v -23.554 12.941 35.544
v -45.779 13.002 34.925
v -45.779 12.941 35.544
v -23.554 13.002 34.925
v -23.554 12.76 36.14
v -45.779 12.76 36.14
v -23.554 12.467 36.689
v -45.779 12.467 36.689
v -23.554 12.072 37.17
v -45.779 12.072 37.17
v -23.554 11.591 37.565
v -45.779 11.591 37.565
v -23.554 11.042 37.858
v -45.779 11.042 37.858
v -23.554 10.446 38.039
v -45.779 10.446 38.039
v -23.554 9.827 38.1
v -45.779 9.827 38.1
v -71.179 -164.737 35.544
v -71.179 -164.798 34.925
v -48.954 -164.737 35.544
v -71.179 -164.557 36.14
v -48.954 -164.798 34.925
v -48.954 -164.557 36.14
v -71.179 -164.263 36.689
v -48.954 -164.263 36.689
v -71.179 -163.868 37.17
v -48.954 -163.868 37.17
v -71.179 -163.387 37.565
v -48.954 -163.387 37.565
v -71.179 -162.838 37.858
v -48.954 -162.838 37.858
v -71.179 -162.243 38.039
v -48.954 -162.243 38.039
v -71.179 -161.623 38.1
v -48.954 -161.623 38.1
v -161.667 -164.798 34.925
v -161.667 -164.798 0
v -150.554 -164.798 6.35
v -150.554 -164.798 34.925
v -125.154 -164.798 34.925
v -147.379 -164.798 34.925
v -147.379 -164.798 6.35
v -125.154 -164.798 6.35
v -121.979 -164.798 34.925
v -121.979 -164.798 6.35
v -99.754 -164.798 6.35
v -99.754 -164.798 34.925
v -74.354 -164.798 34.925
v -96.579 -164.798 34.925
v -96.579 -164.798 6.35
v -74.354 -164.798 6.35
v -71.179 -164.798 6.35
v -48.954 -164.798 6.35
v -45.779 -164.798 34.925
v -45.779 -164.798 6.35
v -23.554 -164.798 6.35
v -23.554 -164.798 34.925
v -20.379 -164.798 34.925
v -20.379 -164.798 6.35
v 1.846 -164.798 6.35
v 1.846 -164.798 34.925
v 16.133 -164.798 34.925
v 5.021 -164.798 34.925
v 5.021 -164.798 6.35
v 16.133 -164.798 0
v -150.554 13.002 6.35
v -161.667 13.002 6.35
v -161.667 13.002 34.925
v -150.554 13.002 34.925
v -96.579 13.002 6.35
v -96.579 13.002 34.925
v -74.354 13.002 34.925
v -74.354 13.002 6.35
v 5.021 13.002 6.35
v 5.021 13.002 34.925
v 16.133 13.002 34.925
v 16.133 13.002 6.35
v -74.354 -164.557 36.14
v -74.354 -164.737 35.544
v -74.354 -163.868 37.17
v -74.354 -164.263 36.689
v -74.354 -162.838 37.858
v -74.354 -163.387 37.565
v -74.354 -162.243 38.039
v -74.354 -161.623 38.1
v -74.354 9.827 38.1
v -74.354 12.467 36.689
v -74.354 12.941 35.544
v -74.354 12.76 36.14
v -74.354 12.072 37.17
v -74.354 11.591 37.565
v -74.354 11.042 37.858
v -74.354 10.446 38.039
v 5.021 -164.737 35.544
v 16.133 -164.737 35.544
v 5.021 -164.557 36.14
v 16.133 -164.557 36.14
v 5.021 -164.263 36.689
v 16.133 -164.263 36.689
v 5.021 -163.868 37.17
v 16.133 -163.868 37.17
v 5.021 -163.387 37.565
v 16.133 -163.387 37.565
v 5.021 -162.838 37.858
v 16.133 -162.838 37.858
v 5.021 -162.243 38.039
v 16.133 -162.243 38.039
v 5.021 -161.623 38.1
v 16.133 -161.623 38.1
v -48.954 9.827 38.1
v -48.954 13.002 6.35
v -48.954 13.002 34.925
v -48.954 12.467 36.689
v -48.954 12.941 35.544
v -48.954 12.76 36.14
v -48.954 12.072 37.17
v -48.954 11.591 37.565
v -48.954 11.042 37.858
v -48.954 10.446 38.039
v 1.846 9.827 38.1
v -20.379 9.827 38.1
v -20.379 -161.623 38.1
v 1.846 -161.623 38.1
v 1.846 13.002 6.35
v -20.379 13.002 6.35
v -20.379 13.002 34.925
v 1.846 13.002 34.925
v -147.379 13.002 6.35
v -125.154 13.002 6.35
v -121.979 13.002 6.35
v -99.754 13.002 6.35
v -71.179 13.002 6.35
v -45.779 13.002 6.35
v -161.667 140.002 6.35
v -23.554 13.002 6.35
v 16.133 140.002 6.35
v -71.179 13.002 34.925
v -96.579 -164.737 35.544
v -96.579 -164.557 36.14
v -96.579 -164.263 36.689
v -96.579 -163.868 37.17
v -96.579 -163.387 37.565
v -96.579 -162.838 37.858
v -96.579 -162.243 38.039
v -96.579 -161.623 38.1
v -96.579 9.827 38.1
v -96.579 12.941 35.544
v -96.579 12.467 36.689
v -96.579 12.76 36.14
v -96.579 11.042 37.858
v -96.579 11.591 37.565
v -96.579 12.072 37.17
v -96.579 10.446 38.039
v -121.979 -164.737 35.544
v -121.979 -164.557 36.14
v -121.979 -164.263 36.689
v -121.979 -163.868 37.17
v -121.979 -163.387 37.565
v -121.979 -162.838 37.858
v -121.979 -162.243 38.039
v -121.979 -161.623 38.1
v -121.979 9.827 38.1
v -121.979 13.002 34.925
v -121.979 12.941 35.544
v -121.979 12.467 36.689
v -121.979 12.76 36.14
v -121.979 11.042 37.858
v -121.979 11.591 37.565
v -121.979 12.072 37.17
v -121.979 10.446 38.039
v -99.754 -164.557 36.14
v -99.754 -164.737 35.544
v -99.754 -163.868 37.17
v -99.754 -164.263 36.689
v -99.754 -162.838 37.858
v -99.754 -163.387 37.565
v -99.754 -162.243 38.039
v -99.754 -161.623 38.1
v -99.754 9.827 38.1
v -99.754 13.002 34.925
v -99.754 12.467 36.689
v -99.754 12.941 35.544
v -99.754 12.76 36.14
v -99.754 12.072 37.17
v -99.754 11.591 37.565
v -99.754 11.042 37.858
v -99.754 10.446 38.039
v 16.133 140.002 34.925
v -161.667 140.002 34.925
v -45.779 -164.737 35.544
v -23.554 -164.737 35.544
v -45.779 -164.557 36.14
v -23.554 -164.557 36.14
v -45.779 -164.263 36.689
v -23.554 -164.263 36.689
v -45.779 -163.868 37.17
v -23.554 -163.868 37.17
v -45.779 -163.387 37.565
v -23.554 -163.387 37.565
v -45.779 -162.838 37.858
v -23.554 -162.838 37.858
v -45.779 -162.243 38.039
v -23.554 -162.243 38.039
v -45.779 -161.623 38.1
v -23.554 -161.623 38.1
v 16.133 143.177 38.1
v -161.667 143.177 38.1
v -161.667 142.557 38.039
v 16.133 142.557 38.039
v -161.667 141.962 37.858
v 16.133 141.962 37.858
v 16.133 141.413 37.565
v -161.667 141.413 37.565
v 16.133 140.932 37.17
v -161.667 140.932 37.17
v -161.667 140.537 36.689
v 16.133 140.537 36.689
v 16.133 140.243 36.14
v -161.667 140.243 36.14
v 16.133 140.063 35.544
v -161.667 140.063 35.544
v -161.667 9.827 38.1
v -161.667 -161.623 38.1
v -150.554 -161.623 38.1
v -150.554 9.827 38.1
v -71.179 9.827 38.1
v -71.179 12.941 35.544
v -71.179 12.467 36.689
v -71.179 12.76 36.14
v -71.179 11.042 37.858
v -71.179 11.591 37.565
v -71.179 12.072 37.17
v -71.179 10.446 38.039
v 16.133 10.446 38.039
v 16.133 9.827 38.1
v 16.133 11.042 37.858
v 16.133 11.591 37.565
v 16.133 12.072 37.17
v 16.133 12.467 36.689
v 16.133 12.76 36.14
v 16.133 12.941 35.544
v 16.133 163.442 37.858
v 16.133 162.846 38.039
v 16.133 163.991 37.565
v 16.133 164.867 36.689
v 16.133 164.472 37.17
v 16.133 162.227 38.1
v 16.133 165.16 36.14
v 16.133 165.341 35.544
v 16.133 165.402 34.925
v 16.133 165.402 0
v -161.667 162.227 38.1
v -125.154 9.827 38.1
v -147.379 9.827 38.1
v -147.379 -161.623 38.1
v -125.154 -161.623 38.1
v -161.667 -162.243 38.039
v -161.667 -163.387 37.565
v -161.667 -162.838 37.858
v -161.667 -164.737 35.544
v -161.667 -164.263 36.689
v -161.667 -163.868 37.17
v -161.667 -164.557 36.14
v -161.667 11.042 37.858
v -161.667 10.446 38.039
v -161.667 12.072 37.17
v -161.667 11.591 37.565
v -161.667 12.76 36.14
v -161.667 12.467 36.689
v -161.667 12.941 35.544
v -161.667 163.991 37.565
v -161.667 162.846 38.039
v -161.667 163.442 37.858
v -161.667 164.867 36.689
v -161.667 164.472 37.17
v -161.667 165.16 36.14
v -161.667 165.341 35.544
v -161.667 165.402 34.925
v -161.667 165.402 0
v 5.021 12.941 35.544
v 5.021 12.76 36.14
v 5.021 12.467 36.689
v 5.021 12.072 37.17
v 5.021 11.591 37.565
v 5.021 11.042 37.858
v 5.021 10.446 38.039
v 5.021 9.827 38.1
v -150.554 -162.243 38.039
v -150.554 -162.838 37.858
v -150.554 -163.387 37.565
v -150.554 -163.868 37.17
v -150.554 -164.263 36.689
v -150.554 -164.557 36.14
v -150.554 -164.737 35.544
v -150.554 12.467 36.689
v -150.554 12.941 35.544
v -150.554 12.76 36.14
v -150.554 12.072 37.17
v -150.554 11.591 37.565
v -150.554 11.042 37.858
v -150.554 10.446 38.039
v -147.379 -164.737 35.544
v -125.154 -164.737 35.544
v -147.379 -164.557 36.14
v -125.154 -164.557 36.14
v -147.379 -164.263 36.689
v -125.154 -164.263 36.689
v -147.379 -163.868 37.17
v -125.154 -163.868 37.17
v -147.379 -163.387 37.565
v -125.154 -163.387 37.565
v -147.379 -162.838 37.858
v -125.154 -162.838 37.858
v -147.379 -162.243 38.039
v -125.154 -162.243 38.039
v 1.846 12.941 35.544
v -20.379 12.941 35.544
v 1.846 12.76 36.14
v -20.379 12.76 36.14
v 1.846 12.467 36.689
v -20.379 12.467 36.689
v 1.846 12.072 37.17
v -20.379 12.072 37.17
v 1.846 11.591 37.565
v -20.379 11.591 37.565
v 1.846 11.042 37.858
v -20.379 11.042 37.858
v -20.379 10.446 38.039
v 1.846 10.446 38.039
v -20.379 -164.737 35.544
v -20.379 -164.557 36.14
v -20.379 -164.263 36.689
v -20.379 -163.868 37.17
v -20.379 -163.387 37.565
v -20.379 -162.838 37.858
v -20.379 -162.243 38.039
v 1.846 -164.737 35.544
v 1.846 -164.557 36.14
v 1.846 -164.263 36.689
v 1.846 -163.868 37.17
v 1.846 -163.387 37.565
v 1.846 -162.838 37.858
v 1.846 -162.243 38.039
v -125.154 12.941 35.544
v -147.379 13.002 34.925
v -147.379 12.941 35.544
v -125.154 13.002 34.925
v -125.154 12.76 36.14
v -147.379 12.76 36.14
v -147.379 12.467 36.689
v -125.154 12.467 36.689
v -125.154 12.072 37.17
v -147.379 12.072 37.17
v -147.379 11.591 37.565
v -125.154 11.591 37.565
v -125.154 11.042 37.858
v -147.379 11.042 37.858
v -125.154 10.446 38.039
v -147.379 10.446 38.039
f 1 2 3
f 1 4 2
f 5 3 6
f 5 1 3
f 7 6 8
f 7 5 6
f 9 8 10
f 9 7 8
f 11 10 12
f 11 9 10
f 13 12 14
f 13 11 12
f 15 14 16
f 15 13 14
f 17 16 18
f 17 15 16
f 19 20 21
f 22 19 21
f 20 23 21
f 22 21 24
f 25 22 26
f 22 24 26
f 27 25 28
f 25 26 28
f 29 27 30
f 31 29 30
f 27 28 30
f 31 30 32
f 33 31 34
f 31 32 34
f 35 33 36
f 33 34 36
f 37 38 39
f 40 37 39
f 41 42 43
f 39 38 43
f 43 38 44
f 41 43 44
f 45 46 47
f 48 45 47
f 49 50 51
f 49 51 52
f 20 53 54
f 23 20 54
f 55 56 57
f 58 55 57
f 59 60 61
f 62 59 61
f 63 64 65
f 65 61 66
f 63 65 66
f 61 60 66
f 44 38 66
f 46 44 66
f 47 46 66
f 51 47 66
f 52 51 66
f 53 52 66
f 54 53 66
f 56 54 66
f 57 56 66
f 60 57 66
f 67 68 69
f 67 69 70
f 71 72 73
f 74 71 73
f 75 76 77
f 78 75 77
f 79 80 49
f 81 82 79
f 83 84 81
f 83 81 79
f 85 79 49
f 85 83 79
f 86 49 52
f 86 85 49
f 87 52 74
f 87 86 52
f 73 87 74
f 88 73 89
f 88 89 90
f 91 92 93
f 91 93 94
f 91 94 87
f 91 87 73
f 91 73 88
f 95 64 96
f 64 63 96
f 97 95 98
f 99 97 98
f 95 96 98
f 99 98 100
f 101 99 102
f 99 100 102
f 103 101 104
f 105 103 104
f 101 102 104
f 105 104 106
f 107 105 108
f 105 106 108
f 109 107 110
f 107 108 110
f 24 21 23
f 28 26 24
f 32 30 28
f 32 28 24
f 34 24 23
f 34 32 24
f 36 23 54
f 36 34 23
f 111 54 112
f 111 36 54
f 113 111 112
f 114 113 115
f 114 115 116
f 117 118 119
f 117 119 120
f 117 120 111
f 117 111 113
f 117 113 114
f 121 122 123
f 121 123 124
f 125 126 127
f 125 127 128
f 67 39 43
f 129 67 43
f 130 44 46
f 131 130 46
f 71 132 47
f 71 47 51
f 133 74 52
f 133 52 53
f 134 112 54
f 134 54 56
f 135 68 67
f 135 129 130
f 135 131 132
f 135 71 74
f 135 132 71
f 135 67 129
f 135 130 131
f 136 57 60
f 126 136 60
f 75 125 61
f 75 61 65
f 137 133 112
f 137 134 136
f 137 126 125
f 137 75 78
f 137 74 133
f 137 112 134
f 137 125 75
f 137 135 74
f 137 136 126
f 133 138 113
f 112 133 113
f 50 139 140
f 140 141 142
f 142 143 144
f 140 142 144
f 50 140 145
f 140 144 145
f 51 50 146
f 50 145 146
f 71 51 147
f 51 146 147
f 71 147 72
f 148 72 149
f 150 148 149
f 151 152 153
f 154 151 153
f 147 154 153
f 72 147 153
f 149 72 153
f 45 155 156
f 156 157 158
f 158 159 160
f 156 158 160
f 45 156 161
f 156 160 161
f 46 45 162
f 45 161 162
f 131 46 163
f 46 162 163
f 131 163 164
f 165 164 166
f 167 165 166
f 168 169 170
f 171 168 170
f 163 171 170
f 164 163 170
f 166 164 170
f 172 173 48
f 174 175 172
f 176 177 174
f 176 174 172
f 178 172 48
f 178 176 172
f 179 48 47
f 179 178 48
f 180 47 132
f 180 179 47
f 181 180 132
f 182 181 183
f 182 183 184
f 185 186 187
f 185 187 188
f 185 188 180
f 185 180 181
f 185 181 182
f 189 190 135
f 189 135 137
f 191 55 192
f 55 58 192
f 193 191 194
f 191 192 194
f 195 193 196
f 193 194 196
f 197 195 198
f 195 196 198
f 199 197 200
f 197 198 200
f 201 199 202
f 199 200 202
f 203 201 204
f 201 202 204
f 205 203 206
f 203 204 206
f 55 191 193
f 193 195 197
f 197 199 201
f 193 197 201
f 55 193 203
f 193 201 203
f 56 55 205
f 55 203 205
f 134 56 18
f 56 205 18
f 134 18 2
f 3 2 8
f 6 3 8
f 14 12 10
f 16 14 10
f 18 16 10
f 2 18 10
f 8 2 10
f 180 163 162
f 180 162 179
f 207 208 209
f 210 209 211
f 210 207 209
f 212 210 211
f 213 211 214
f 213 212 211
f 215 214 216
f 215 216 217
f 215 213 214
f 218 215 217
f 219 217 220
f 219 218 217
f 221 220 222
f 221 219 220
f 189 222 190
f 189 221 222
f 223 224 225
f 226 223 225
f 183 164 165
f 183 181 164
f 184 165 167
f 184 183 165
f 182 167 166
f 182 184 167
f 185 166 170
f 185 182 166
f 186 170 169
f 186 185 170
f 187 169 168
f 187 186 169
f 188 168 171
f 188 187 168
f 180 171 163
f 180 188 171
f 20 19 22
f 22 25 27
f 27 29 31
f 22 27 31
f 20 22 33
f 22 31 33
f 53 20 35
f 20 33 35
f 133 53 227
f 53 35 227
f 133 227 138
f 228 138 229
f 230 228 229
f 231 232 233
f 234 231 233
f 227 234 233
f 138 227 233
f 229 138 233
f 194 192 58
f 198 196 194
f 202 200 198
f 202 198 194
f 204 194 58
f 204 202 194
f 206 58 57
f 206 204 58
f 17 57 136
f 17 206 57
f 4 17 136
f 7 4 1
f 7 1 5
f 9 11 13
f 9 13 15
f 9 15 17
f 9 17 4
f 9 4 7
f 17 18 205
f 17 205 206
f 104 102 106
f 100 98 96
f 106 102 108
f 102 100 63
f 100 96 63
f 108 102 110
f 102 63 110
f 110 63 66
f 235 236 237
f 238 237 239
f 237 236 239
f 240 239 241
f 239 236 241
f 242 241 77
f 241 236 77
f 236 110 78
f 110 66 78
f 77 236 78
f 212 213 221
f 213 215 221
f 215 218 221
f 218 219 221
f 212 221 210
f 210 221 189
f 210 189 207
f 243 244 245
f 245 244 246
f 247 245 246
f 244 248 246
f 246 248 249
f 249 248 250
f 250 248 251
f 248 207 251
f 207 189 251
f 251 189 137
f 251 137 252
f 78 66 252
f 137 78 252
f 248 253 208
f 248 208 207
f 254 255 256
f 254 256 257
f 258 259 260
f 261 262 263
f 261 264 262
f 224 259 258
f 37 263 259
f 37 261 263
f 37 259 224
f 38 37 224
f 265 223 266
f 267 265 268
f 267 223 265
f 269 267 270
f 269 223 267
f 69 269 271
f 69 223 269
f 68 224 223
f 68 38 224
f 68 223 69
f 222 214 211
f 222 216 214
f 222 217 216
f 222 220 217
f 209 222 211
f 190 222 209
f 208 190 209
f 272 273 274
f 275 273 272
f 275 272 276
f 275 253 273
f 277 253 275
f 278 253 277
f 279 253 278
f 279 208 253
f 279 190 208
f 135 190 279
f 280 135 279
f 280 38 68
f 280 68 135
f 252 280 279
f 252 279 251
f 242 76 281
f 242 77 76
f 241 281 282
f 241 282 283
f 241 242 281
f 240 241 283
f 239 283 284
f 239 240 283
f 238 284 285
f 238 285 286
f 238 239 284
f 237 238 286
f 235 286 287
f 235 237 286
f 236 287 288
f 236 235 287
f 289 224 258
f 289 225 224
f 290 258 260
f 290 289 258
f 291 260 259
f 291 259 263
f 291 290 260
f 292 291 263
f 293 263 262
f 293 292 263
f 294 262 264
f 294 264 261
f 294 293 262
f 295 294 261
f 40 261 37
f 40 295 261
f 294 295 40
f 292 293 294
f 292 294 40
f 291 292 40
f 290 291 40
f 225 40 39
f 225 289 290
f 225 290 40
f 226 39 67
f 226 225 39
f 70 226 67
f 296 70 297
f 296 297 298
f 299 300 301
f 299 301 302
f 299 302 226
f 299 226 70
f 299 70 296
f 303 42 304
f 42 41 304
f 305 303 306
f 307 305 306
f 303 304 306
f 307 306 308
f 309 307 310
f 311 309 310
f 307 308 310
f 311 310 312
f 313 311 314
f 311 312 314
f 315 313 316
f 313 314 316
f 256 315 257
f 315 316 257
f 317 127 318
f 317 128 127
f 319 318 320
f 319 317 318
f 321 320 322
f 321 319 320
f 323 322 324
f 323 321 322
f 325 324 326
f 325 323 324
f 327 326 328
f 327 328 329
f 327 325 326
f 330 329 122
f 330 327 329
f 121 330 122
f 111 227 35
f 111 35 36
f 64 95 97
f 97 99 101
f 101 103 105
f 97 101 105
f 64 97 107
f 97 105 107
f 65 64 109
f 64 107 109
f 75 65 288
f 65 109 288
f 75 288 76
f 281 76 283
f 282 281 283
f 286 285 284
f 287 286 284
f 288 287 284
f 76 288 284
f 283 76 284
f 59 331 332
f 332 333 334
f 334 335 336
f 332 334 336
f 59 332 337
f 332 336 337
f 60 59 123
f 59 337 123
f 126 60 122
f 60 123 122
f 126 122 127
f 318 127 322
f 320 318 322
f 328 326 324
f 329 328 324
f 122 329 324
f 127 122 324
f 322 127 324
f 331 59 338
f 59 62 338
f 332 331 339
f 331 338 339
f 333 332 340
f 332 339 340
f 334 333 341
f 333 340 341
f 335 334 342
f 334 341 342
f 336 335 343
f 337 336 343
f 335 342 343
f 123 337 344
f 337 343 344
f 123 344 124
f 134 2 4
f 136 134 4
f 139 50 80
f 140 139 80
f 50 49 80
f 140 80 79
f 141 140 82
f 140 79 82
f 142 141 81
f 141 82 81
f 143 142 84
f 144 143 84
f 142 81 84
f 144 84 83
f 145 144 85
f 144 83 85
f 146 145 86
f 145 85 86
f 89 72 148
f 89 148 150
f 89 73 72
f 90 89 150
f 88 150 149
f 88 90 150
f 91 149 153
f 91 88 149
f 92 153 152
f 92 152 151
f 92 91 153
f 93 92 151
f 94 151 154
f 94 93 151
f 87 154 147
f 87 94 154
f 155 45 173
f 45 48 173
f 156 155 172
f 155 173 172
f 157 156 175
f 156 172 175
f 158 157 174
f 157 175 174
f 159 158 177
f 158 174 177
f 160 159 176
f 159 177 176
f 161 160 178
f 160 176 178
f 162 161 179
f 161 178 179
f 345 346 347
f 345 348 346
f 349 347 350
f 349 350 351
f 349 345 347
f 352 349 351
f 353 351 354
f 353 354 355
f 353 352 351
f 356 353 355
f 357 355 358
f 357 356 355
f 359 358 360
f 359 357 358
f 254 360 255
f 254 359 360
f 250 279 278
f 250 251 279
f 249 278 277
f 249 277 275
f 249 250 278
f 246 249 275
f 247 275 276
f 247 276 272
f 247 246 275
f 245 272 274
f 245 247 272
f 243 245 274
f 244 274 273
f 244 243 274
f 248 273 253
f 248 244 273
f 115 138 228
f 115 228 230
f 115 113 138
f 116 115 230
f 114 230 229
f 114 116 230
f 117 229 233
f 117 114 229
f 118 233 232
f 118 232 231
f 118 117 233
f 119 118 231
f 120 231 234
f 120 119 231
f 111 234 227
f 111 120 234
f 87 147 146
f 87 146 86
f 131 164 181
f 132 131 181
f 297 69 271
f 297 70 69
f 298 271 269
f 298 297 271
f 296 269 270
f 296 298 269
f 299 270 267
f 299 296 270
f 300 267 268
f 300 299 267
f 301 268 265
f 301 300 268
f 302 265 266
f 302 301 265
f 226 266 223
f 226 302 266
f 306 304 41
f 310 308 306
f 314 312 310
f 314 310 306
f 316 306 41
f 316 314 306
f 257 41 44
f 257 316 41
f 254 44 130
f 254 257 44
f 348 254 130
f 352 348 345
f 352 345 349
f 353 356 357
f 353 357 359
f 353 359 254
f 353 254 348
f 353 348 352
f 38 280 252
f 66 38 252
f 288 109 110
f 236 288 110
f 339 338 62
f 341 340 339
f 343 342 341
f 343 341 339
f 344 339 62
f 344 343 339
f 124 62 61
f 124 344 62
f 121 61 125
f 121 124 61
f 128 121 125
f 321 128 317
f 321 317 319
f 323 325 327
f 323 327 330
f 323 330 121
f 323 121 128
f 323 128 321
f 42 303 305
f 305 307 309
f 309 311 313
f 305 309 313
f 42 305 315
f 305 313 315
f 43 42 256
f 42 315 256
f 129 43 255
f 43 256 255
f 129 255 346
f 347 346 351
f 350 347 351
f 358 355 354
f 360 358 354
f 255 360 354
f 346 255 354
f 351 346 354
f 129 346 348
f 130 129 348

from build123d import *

# Parameters (mm, degrees)
F0_W     = 177.8
F0_H     = 330.2
F1_DEPTH = 38.1
F2_W     = 177.8
F2_H     = 127
F3_DEPTH = 31.75
F4_W     = 3.175
F4_H     = 177.8
F5_DEPTH = 31.75
F6_R     = 3.175


with BuildPart() as f1:
    # F0 (on Top) → F1 (new body)
    with BuildSketch(Plane.XY):
        with Locations((-72.766965, 0.301726)):
            Rectangle(F0_W, F0_H)
    extrude(amount=F1_DEPTH)

    # F2 (on face) → F3 (cut)
    with BuildSketch(Plane.XY.offset(38.1)):
        with Locations((-72.766965, 76.501726)):
            Rectangle(F2_W, F2_H)
    extrude(amount=-F3_DEPTH, mode=Mode.SUBTRACT)

    # F4 (on face) → F5 (cut)
    with BuildSketch(Plane.XY.offset(38.1)):
        with Locations((-148.966965, -75.898274)):
            Rectangle(F4_W, F4_H)
        with Locations((-123.566965, -75.898274)):
            Rectangle(F4_W, F4_H)
        with Locations((-98.166965, -75.898274)):
            Rectangle(F4_W, F4_H)
        with Locations((-72.766965, -75.898274)):
            Rectangle(F4_W, F4_H)
        with Locations((-47.366965, -75.898274)):
            Rectangle(F4_W, F4_H)
        with Locations((-21.966965, -75.898274)):
            Rectangle(F4_W, F4_H)
        with Locations((3.433035, -75.898274)):
            Rectangle(F4_W, F4_H)
    extrude(amount=-F5_DEPTH, mode=Mode.SUBTRACT)

    # F6
    f6_edges = [f1.edges().sort_by_distance(p)[0] for p in [
        (-72.766965, 140.001726, 38.1),
        (10.576785, -164.798274, 38.1),
        (-9.266965, -164.798274, 38.1),
        (-34.666965, -164.798274, 38.1),
        (-60.066965, -164.798274, 38.1),
        (-85.466965, -164.798274, 38.1),
        (-110.866965, -164.798274, 38.1),
        (-136.266965, -164.798274, 38.1),
        (-156.110715, -164.798274, 38.1),
        (10.576785, 13.001726, 38.1),
        (-156.110715, 13.001726, 38.1),
        (-136.266965, 13.001726, 38.1),
        (-110.866965, 13.001726, 38.1),
        (-85.466965, 13.001726, 38.1),
        (-60.066965, 13.001726, 38.1),
        (-34.666965, 13.001726, 38.1),
        (-9.266965, 13.001726, 38.1),
        (-72.766965, 165.401726, 38.1),
    ]]
    fillet(f6_edges, radius=F6_R)


solid = f1.part
